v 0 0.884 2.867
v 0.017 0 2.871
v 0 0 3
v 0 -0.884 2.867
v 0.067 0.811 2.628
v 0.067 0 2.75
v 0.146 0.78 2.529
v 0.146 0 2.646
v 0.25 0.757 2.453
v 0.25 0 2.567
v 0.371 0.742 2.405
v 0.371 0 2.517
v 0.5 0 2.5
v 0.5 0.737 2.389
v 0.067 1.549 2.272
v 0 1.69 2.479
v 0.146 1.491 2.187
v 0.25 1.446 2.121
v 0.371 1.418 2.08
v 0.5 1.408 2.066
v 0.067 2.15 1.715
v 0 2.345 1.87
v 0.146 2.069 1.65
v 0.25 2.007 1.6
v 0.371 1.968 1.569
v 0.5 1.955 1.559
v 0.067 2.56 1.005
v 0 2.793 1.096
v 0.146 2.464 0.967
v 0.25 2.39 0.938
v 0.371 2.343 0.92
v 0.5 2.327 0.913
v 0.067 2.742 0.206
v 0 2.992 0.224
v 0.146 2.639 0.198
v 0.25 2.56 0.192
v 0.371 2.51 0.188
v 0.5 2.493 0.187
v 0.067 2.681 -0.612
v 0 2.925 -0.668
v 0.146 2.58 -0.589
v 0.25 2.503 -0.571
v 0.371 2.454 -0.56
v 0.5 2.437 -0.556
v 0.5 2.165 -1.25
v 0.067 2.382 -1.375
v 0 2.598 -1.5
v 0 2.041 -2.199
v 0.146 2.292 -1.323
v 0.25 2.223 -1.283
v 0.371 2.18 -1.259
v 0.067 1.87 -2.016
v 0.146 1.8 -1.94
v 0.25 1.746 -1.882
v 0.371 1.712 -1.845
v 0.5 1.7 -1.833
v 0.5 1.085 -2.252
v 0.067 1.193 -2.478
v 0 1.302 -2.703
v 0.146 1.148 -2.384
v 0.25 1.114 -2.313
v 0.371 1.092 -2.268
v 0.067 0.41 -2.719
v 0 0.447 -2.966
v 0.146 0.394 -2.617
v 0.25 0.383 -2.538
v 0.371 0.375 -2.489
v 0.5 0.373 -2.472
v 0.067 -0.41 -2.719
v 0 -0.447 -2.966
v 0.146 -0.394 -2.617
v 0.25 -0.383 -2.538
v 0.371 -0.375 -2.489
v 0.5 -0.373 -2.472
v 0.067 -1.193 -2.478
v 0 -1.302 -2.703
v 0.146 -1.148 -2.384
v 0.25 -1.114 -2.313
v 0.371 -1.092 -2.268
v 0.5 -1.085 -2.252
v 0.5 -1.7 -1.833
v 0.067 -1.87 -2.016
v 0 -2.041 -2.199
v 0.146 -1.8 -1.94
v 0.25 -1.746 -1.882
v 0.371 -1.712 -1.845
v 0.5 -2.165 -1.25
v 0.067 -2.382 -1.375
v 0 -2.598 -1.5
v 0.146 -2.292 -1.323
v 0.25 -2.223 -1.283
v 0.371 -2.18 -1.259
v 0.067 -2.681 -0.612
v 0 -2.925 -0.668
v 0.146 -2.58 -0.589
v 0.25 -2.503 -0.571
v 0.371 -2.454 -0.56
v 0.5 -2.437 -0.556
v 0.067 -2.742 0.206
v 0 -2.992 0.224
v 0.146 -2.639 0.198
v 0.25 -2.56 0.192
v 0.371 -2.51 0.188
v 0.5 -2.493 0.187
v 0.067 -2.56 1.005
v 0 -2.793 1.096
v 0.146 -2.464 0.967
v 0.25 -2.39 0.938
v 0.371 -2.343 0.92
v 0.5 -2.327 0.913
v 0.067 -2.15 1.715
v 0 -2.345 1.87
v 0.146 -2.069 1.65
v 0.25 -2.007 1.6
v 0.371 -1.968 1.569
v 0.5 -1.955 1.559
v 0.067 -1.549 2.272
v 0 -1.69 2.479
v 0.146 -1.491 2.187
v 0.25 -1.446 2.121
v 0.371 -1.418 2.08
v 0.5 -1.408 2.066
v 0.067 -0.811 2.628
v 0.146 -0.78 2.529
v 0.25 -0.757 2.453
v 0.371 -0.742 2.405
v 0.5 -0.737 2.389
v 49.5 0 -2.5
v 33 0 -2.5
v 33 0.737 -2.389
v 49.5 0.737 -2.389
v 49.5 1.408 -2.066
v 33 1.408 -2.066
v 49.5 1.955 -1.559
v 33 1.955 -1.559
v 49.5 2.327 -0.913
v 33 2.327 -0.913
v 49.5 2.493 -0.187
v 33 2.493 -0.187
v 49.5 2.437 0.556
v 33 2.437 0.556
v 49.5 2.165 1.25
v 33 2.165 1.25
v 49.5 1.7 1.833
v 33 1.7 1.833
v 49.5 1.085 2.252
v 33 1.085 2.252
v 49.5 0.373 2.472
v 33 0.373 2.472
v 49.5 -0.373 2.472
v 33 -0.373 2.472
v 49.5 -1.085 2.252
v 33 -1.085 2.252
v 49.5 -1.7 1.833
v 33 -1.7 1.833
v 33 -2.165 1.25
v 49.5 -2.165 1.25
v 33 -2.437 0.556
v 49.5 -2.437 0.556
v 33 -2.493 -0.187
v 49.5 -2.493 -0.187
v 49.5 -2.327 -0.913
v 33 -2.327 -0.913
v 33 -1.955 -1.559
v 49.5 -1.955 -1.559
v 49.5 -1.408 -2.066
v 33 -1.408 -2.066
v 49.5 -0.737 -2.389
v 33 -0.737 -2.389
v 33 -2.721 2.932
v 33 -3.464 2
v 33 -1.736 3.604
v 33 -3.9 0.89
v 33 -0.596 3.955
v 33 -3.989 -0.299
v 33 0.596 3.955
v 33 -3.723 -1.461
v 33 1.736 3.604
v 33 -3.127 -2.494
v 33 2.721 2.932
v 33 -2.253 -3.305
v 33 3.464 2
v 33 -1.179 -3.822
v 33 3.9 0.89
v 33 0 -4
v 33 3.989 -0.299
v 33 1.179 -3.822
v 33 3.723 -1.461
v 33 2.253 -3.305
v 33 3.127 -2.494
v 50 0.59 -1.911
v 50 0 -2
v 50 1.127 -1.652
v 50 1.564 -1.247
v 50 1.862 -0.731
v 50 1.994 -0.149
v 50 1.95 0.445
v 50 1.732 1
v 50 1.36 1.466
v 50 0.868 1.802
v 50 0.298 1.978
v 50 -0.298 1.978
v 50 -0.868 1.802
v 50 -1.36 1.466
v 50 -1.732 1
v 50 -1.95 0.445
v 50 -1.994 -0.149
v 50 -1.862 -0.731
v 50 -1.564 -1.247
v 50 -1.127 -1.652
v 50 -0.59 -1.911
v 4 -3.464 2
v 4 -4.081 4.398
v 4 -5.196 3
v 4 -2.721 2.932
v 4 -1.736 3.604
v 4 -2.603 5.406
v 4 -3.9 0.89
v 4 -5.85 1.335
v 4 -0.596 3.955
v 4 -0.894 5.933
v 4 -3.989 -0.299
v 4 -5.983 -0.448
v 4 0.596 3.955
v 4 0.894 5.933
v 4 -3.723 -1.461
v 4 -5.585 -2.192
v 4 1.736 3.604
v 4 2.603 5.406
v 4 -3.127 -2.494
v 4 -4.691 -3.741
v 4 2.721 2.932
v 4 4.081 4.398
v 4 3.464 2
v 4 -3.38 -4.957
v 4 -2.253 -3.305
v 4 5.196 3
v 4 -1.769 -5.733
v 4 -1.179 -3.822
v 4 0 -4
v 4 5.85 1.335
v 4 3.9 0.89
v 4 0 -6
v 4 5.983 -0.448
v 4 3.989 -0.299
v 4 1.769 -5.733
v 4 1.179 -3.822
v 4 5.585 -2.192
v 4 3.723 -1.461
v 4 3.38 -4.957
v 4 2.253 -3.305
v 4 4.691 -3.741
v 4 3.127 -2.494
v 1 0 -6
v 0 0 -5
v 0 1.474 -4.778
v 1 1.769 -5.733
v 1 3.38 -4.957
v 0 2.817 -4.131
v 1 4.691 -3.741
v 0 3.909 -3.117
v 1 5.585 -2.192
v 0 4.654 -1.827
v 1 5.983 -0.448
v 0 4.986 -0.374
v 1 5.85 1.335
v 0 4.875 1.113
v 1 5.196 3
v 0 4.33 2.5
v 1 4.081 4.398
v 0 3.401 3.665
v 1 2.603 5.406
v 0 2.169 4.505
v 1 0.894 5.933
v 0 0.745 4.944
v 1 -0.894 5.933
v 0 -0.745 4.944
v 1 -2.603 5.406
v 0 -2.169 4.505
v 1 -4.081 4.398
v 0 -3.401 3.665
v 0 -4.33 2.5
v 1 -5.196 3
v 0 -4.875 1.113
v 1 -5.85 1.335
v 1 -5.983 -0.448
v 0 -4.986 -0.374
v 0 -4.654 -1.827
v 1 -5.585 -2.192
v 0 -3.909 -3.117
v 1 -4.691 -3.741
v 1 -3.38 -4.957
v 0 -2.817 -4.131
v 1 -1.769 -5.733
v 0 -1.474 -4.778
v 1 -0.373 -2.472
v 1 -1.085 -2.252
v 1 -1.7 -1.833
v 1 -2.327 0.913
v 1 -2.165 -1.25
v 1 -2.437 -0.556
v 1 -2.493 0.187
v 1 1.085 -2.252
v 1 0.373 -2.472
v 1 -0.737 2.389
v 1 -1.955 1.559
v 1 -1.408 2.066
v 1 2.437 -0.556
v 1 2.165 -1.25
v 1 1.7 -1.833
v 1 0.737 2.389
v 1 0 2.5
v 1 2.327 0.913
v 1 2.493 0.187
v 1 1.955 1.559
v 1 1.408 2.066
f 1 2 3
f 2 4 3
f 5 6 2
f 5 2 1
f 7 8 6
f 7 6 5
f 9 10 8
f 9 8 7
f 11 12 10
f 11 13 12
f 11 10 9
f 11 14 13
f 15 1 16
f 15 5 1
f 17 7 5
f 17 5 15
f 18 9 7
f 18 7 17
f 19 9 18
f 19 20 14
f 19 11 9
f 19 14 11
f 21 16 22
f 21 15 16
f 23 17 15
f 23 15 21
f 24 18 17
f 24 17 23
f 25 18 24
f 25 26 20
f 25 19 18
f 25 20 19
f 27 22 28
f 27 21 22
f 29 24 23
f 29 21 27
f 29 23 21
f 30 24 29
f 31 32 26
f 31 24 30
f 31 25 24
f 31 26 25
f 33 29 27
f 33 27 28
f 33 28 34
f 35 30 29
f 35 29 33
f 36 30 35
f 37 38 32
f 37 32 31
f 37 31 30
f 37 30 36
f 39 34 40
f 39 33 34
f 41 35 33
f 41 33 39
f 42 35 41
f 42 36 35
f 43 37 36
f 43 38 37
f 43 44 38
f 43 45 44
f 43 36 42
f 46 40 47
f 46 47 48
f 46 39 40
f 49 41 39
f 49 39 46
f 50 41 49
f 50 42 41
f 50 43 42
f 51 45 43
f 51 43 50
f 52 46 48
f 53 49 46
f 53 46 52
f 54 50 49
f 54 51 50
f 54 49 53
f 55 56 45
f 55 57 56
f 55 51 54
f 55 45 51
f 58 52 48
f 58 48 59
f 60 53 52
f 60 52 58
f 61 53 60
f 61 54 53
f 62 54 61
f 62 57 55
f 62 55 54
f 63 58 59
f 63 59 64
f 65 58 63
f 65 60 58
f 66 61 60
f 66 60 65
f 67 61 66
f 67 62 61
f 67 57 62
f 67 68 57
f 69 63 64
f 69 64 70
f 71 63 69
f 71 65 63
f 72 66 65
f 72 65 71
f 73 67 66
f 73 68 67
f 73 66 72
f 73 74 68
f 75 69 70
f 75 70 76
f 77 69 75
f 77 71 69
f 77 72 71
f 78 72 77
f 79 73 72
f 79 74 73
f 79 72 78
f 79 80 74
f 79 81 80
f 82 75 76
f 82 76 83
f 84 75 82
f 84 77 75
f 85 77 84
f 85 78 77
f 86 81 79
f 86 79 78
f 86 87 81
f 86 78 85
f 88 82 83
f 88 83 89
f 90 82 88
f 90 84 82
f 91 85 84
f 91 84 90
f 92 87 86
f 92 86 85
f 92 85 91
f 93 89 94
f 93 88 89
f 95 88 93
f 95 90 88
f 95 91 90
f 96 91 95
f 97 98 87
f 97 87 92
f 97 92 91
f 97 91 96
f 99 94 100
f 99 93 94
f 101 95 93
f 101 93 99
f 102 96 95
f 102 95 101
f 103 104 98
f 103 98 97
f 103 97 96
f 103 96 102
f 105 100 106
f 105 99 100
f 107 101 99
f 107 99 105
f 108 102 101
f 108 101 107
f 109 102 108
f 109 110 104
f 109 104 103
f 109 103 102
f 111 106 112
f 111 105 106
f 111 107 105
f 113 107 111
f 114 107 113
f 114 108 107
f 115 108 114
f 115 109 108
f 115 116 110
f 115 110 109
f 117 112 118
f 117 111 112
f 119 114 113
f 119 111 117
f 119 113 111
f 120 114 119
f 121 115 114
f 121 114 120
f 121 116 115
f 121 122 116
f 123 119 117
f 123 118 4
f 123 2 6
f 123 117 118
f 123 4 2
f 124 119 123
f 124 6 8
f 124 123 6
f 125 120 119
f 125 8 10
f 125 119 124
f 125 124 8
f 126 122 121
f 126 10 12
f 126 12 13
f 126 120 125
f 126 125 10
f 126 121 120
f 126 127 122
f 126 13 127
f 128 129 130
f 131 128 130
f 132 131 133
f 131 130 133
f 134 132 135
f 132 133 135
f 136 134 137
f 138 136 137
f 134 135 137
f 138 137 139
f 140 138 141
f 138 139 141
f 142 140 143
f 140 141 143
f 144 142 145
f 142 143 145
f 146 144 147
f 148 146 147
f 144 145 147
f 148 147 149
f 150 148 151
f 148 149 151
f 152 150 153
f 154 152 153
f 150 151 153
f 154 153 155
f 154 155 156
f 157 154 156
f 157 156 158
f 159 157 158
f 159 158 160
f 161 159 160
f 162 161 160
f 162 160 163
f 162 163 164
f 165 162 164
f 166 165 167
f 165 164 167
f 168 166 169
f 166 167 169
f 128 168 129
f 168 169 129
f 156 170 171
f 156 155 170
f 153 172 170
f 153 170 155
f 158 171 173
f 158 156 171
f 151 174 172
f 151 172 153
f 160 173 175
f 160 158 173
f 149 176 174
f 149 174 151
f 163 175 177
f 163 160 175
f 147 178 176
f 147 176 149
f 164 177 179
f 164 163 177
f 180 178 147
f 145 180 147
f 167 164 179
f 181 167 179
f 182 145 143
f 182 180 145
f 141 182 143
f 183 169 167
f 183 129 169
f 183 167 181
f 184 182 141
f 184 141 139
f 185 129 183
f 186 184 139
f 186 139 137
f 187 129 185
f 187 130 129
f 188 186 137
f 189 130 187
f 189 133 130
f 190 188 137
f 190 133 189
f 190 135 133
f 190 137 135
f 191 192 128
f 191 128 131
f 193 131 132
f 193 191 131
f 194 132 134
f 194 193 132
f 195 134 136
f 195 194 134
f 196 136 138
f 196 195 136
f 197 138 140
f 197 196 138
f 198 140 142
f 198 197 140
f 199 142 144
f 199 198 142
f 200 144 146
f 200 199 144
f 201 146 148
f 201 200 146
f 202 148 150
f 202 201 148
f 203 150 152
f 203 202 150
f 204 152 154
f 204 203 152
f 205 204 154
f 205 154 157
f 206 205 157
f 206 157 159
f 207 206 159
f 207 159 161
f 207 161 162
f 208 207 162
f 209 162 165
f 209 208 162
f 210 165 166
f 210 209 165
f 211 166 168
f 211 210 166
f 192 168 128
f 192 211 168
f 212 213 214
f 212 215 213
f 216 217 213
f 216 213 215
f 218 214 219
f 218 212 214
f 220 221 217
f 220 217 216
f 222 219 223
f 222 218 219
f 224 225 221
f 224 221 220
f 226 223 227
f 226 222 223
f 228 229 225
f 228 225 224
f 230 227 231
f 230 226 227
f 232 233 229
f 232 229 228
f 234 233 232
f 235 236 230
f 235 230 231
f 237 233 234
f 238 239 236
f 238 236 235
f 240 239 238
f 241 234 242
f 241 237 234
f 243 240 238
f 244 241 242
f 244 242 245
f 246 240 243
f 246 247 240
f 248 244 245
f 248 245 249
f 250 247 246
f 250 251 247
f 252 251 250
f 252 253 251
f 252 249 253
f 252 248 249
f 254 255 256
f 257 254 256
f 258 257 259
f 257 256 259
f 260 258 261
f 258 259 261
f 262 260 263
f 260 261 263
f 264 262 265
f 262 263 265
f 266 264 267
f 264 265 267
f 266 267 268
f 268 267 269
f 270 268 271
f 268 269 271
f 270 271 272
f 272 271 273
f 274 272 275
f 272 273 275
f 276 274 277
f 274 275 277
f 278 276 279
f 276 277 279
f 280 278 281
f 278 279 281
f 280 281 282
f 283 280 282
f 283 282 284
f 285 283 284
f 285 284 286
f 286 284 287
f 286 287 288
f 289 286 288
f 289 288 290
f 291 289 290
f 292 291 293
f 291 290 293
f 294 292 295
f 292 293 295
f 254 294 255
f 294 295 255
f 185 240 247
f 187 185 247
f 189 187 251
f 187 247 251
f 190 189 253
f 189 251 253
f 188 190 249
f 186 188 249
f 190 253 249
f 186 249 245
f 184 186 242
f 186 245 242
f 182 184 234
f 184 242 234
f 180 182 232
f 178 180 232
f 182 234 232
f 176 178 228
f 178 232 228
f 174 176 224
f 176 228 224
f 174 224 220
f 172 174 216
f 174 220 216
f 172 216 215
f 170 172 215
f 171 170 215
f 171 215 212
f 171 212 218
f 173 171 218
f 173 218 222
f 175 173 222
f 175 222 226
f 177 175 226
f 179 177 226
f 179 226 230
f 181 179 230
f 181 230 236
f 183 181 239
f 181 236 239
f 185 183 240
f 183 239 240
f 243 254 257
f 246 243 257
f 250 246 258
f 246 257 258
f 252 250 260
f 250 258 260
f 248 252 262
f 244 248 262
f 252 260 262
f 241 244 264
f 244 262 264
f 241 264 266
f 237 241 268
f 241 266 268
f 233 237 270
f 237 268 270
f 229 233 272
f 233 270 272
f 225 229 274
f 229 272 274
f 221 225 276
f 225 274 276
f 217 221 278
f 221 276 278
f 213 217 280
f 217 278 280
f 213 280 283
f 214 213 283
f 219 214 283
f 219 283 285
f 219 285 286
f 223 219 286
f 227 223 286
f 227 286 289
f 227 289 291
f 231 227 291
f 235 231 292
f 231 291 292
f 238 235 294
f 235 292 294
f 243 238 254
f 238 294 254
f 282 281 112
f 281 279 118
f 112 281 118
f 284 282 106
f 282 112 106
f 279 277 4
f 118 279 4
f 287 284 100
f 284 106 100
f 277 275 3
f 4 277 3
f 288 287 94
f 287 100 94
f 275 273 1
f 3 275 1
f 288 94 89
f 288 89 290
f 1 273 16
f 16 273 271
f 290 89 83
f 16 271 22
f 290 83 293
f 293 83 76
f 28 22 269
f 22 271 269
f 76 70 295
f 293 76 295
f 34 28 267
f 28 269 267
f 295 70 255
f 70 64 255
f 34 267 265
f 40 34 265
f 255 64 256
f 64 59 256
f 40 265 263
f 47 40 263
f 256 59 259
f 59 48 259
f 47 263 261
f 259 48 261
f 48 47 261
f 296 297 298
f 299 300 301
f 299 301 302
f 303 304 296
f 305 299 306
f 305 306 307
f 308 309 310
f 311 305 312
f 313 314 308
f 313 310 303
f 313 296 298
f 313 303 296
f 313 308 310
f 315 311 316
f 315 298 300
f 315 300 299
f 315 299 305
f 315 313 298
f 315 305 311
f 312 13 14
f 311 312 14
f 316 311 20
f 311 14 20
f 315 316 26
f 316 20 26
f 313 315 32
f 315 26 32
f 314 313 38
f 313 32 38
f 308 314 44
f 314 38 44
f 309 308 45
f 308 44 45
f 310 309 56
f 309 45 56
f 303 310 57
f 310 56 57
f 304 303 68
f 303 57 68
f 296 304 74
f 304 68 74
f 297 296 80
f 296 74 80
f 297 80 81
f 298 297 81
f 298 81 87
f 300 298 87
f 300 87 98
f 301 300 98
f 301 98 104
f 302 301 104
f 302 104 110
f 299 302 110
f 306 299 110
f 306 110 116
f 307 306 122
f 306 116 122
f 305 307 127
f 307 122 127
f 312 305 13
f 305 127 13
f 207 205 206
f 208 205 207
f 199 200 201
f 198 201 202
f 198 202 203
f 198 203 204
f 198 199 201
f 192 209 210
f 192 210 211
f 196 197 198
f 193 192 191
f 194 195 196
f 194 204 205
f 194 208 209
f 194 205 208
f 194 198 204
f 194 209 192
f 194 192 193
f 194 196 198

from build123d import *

# Parameters (mm, degrees)
SKETCH1_R           = 6
BOSS_EXTRUDE1_DEPTH = 4
SKETCH2_R           = 4
BOSS_EXTRUDE2_DEPTH = 29
SKETCH3_R           = 2.5
BOSS_EXTRUDE3_DEPTH = 17
CHAMFER1_SIZE       = 0.5
CHAMFER2_SIZE       = 1
SKETCH4_R           = 2.5
CUT_EXTRUDE1_DEPTH  = 1
FILLET1_R           = 0.5


with BuildPart() as part:
    # Sketch1 → Boss-Extrude1 (new body)
    with BuildSketch(Plane(origin=(0, 0, 0), x_dir=(0, 0, -1), z_dir=(1, 0, 0))):
        Circle(SKETCH1_R)
    extrude(amount=BOSS_EXTRUDE1_DEPTH)

    # Sketch2 → Boss-Extrude2 (add)
    with BuildSketch(Plane(origin=(4, 0, 0), x_dir=(0, 0, -1), z_dir=(1, 0, 0))):
        Circle(SKETCH2_R)
    extrude(amount=BOSS_EXTRUDE2_DEPTH)

    # Sketch3 → Boss-Extrude3 (add)
    with BuildSketch(Plane(origin=(33, 0, 0), x_dir=(0, 0, -1), z_dir=(1, 0, 0))):
        Circle(SKETCH3_R)
    extrude(amount=BOSS_EXTRUDE3_DEPTH)

    # Chamfer1
    chamfer1_edges = [part.edges().sort_by_distance(p)[0] for p in [
        (50, 0, 2.5),
    ]]
    chamfer(chamfer1_edges, length=CHAMFER1_SIZE)

    # Chamfer2
    chamfer2_edges = [part.edges().sort_by_distance(p)[0] for p in [
        (0, 0, 6),
    ]]
    chamfer(chamfer2_edges, length=CHAMFER2_SIZE)

    # Sketch4 → Cut-Extrude1 (cut)
    with BuildSketch(Plane.ZY):
        Circle(SKETCH4_R)
    extrude(amount=-CUT_EXTRUDE1_DEPTH, mode=Mode.SUBTRACT)

    # Fillet1
    fillet1_edges = [part.edges().sort_by_distance(p)[0] for p in [
        (0, 0, -2.5),
    ]]
    fillet(fillet1_edges, radius=FILLET1_R)


solid = part.part
